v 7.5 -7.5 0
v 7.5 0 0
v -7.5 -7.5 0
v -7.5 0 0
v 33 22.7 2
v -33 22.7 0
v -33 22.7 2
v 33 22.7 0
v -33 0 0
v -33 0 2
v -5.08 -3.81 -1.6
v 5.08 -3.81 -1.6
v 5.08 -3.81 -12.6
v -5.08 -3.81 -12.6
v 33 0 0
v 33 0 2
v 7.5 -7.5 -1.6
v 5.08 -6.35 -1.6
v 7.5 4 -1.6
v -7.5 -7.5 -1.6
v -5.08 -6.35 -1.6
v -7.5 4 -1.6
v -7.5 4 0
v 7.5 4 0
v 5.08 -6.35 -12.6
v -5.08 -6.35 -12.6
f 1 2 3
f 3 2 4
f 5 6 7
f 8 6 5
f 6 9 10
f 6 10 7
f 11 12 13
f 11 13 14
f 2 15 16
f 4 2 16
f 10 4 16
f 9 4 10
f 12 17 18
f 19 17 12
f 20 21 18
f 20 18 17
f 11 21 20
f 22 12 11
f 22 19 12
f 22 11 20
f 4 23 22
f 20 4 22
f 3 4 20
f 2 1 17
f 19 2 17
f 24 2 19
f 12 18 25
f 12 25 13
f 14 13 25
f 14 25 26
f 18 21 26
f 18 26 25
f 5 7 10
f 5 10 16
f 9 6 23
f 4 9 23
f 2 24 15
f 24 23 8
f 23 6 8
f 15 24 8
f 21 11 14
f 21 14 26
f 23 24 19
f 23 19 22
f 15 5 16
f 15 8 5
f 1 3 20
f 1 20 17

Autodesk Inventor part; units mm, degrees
ref_plane "YZ Plane" through (0, 0, 0) normal (1, 0, 0) x (0, 1, 0)
ref_plane "XZ Plane" through (0, 0, 0) normal (0, 1, 0) x (-1, 0, 0)
ref_plane "XY Plane" through (0, 0, 0) normal (0, 0, 1) x (1, 0, 0)
sketch "スケッチ1" plane through (0, 0, 0) normal (0, 0, 1) x (1, 0, 0)
  line L0 (-33, 22.7) -> (33, 22.7)
  line L1 (33, 22.7) -> (33, 0)
  line L2 (33, 0) -> (-33, 0)
  line L3 (-33, 0) -> (-33, 22.7)
  point P0 (0, 0)
  point P1 (0, 0)
  dimension "d0" = 66
  dimension "d1" = 22.7
extrude "押し出し1" add sketch "スケッチ1" along normal blind 2
sketch "スケッチ3" plane through (0, 0, 0) normal (0, 0, -1) x (-1, 0, 0)
  line L0 (-7.5, 4) -> (7.5, 4)
  line L1 (7.5, 4) -> (7.5, -7.5)
  line L2 (7.5, -7.5) -> (-7.5, -7.5)
  line L3 (-7.5, -7.5) -> (-7.5, 4)
  line L4 (33, 0) -> (-33, 0) projected
  point P0 (0, 0)
  point P1 (0, 4)
  point P2 (0, 0)
  dimension "d4" = 15
  dimension "d5" = 11.5
  dimension "d6" = 4
extrude "押し出し2" add sketch "スケッチ3" along normal blind 1.6
sketch "スケッチ4" plane through (0, 0, -1.6) normal (0, 0, -1) x (-1, 0, 0)
  line L0 (-5.08, -3.81) -> (5.08, -3.81)
  line L1 (5.08, -3.81) -> (5.08, -6.35)
  line L2 (5.08, -6.35) -> (-5.08, -6.35)
  line L3 (-5.08, -6.35) -> (-5.08, -3.81)
  point P0 (0, 0)
  point P1 (0, -3.81)
  point P2 (5.08, -5.08)
  dimension "d9" = 10.16
  dimension "d10" = 2.54
  dimension "d11" = 5.08
extrude "押し出し3" add sketch "スケッチ4" along normal blind 11
properties part number "AE-AQM1602A"
